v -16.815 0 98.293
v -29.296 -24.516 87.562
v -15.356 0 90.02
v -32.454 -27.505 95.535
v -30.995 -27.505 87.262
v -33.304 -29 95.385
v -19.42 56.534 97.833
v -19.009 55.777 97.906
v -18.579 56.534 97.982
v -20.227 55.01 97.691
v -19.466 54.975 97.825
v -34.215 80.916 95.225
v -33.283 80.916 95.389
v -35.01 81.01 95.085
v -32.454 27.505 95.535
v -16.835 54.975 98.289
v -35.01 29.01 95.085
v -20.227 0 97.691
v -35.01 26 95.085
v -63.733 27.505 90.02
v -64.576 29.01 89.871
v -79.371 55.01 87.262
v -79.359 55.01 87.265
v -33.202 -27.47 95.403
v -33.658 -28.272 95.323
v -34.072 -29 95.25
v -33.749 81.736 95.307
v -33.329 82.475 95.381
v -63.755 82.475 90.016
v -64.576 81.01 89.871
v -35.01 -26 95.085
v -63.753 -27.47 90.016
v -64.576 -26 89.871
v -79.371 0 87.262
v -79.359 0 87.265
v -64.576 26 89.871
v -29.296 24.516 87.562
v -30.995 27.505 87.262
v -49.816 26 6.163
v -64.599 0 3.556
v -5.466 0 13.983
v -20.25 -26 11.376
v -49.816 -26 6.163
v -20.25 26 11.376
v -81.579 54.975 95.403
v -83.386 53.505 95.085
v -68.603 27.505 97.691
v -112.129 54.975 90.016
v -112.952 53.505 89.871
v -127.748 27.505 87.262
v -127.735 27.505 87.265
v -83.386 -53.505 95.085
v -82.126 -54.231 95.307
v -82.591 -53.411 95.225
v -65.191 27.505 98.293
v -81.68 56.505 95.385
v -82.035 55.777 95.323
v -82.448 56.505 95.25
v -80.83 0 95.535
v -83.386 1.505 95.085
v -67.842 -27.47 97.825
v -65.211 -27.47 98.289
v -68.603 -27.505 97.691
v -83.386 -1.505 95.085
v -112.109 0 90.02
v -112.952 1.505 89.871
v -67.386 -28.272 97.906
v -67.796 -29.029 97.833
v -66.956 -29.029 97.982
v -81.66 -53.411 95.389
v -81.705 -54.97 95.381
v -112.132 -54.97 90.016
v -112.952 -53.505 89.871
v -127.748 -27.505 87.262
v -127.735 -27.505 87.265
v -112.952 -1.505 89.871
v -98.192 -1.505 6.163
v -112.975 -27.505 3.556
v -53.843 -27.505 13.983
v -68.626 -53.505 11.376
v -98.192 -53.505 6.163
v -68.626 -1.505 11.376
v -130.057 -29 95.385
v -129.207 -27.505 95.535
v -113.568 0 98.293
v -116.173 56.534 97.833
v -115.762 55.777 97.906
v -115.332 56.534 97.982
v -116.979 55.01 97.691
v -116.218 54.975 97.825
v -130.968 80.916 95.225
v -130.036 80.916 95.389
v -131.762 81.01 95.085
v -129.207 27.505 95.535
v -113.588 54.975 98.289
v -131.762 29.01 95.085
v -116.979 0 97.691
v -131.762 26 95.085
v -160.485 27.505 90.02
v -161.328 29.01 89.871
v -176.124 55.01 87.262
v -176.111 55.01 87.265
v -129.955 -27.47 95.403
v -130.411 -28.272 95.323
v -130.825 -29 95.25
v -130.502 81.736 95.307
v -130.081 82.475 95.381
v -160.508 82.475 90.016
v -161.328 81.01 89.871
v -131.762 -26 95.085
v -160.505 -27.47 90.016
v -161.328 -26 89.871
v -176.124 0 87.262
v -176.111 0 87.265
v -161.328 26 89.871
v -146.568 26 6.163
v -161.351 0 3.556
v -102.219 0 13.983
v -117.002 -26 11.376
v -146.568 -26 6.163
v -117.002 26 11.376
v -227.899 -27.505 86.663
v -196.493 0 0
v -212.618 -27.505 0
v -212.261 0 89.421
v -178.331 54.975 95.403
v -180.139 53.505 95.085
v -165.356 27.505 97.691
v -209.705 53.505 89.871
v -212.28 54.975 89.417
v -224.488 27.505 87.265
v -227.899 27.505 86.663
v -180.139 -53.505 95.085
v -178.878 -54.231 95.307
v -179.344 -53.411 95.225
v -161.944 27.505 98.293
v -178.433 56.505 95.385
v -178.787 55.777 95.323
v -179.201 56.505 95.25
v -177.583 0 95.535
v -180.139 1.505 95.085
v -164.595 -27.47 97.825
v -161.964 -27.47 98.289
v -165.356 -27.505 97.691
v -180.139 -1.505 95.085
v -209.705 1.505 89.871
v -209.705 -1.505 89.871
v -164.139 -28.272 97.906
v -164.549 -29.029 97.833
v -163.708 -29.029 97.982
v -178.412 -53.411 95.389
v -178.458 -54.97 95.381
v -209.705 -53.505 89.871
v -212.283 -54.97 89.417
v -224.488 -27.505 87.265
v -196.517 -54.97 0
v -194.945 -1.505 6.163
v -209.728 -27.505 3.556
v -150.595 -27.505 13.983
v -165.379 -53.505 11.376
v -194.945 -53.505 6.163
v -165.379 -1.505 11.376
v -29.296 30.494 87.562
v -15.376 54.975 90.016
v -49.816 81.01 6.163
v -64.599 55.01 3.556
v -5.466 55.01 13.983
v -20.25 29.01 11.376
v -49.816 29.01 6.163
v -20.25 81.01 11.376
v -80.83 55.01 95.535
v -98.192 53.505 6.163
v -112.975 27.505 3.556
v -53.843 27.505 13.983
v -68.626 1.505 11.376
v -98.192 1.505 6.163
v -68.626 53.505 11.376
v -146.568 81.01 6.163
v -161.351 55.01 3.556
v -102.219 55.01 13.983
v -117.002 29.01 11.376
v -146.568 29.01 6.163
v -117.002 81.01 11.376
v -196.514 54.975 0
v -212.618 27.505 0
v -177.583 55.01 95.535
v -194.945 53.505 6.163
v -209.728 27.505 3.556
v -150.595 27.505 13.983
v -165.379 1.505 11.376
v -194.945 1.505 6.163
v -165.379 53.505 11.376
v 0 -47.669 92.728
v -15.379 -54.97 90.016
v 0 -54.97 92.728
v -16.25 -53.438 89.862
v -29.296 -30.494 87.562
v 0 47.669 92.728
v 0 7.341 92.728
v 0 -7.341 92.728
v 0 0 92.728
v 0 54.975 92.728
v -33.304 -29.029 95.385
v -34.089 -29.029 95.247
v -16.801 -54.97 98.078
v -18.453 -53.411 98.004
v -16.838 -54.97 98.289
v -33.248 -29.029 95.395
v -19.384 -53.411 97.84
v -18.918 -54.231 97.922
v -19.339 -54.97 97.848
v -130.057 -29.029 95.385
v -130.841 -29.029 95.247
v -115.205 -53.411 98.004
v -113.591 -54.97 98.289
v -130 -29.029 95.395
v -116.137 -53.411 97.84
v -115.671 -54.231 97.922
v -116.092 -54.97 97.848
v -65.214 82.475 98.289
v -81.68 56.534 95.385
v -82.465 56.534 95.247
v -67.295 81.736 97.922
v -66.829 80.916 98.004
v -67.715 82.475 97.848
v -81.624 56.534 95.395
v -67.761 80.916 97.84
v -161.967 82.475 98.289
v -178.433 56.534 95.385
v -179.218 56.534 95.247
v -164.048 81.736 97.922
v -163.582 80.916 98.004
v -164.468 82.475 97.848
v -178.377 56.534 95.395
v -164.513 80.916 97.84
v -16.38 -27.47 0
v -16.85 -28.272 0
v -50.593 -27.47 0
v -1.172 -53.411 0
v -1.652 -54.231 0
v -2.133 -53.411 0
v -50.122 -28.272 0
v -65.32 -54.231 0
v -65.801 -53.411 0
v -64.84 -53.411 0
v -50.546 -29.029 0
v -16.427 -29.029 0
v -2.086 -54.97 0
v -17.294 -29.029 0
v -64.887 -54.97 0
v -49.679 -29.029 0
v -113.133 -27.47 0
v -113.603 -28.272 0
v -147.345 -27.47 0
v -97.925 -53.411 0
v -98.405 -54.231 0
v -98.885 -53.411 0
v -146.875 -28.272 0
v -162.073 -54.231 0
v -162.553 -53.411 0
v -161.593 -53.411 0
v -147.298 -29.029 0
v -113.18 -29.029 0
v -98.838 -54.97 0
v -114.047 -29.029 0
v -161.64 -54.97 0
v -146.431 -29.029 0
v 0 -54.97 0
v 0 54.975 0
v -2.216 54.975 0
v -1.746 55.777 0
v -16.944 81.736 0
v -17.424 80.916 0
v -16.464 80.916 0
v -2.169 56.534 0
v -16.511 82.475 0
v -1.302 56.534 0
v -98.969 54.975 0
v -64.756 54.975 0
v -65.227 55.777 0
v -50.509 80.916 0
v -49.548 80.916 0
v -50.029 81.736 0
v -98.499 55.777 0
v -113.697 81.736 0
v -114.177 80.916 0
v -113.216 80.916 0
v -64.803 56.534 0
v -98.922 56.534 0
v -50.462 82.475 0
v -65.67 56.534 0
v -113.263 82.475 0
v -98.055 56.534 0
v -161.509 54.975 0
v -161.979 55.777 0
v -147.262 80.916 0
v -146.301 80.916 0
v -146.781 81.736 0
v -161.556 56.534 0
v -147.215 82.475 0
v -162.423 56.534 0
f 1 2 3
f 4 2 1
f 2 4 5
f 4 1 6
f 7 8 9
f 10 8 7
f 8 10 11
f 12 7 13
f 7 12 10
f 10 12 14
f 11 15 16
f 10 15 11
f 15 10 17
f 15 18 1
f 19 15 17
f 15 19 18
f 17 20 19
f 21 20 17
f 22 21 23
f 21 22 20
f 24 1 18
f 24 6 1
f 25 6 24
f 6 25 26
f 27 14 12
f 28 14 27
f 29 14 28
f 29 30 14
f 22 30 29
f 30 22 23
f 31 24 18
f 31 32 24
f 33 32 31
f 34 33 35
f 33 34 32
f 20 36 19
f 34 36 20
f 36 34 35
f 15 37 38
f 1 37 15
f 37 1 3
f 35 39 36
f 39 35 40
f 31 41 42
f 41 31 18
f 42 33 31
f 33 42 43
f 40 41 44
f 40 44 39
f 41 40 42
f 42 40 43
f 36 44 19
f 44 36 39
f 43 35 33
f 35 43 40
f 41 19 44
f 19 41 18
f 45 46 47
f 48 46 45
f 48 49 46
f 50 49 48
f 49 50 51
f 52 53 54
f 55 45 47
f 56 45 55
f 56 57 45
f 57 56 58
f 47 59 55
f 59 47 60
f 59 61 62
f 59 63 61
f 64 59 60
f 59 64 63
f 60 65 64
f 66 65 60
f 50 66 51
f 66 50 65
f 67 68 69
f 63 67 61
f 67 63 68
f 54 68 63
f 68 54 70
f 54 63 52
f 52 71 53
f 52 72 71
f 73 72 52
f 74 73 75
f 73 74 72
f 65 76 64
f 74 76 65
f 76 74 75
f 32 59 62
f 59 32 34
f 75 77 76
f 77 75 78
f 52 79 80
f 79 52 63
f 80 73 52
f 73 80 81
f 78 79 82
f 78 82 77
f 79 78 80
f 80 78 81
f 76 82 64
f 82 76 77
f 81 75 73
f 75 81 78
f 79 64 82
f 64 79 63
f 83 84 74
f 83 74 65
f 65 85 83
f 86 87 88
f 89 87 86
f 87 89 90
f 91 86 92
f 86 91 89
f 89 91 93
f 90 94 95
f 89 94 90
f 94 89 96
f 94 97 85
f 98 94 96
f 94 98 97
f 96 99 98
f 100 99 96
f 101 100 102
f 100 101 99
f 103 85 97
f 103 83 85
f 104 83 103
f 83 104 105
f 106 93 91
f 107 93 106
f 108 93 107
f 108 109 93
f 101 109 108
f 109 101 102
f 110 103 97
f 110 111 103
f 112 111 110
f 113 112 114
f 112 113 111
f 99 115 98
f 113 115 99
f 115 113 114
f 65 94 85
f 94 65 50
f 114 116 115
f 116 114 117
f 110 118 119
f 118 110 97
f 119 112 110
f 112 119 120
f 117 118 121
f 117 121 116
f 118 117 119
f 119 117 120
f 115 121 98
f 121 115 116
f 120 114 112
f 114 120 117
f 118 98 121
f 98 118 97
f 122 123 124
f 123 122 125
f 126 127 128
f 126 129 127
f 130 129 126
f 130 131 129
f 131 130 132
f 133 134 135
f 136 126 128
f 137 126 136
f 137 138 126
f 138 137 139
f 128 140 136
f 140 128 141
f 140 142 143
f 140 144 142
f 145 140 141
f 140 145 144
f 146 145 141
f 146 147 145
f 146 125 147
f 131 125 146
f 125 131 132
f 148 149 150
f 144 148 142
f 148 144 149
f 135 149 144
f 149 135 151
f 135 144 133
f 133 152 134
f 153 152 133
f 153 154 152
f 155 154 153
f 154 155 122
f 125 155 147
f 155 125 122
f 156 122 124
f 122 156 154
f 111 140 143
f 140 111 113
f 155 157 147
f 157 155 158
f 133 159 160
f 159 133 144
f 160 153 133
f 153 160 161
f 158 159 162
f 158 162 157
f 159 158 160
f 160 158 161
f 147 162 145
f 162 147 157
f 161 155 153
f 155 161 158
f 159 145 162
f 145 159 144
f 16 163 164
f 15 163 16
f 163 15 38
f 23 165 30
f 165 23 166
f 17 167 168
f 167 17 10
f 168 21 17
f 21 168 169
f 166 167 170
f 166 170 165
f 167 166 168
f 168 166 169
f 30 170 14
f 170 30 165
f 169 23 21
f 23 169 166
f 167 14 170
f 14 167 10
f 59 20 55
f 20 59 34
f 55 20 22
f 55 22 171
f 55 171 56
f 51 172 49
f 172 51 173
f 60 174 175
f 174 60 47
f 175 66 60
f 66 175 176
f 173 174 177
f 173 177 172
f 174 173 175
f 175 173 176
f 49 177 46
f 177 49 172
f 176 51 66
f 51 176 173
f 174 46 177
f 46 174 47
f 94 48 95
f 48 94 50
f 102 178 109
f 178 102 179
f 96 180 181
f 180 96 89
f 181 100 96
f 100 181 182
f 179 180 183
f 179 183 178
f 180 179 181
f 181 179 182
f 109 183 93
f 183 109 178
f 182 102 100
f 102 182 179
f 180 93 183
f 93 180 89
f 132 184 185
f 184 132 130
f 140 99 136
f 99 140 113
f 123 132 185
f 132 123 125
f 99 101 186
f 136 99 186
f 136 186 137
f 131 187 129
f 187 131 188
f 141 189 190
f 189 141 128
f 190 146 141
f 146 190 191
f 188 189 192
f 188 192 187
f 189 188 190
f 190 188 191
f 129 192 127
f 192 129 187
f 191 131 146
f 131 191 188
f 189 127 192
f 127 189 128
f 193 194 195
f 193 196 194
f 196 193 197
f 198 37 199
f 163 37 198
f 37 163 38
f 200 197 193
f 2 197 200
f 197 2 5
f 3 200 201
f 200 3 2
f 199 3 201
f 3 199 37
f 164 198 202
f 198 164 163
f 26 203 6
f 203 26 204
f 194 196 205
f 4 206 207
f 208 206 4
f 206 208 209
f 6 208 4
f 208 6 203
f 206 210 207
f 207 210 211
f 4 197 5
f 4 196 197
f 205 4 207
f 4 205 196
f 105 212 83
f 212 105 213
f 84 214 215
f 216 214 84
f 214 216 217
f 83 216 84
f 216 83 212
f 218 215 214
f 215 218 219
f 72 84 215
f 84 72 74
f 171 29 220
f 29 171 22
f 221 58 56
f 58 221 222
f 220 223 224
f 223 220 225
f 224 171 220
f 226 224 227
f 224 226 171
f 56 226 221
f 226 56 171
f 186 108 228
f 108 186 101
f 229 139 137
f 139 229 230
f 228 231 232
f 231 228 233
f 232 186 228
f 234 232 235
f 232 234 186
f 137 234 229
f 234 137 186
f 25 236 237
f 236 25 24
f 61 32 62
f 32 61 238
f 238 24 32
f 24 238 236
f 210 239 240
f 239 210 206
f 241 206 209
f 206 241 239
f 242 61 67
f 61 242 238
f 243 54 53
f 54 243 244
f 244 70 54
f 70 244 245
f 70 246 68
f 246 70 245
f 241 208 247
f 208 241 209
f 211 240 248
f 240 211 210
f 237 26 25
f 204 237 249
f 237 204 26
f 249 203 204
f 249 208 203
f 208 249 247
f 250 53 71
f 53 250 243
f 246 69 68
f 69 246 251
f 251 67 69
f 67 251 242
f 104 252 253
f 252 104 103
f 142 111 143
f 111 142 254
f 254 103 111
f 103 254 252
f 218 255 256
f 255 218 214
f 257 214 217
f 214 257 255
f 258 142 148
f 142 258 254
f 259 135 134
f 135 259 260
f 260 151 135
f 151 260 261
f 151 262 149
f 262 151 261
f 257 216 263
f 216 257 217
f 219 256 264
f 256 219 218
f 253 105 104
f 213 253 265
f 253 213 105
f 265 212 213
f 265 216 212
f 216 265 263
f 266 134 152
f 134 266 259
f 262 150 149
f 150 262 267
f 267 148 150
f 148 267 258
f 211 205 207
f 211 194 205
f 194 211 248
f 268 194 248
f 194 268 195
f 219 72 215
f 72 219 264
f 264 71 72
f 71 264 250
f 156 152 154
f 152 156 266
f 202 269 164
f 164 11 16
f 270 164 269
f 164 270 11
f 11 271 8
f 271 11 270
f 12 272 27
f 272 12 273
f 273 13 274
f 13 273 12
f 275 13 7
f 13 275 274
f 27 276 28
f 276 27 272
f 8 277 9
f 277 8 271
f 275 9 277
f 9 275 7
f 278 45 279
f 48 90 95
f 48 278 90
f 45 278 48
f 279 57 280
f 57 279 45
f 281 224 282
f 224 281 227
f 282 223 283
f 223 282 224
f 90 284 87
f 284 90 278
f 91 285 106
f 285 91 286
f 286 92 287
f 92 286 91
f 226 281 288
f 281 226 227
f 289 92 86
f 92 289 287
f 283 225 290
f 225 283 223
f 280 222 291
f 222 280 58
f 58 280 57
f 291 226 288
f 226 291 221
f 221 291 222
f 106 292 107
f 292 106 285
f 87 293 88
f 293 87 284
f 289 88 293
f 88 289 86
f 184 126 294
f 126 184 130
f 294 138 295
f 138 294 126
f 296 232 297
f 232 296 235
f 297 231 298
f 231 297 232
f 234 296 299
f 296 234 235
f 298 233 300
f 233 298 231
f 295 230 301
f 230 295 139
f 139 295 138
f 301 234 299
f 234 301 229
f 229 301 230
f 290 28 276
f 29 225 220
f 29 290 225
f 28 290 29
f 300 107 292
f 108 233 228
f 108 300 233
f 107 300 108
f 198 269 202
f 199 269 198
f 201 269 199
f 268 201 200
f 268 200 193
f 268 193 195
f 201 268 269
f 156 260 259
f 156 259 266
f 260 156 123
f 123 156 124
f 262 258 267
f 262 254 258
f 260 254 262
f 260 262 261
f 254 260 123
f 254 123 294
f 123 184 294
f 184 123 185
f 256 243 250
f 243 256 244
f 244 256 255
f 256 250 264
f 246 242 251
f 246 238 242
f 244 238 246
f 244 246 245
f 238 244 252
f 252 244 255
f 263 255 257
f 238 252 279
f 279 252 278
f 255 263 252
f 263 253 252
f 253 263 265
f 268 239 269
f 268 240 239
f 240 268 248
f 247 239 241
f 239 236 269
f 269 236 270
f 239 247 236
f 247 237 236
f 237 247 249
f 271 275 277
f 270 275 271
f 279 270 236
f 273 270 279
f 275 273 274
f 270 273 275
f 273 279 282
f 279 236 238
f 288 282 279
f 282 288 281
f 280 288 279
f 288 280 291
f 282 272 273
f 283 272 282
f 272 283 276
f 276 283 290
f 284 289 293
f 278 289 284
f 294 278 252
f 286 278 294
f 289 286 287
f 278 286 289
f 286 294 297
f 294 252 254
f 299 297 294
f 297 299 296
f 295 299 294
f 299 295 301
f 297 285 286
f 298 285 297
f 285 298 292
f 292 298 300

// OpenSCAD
// =================================================================
// A modular hexagonal rack, good for storing cylinders such as
// spice jars!
// =================================================================
// Copyright Jody Sankey 2019.
//
// This work is licensed under the Creative Commons Attribution 4.0
// International License. To view a copy of this license, visit 
// http://creativecommons.org/licenses/by/4.0/ or send a letter to
// Creative Commons, PO Box 1866, Mountain View, CA 94042, USA.
// =================================================================


// CONTROL VARIABLES
// =================

// Width across flats of each hole.
hole_af = 52;
// Maximum depth of each hole.
max_depth = 85;
// The angle of each hole away from horizontal
angle = 10;
// Thickness of the wall between holes.
wall = 3;
// Length of each side on interlocking tabs as a fraction of wall thickness.
tab_fraction = 0.3;
// Gap between large mating faces at the interlocking tabs.
tab_margin = 0.08;
// Small offset to ensure differences are resolved correctly.
nudge = 0.01;

// Use the "output" section at the bottom of the file to control the
// number of rows and columns, and which sides have interlocking tabs.





// CALCULATED VARIABLES
// ====================

// Width across corners of each hole.
hole_ac = hole_af/sin(60);
// Width across flats of the block each hole is cut from.
block_af = hole_af + 2*wall;
// Width across corners of the block each hole is cut from.
block_ac = block_af/sin(60);

// Spacing between horizontal centers
horizontal_spacing = hole_af+wall+nudge;
// Spacing between vertical centers
not_yet_projected_spacing = ((hole_af+wall)/sin(60) * 3/4) + nudge;
vertical_spacing = not_yet_projected_spacing /cos(angle);



// HELPER MODULES
// ==============

// Returns a hexagonal prism with a centreline on y/z and a body increasing in x
module hex_prism(length, width_af) {
  rotate([0,90,0])
    linear_extrude(height=length)
    circle(r=(width_af/2/sin(60)), $fn=6);
}

// Returns a locking tab with the key face on x/z, centered on z.
//   length(float) - Length of the part in z.
//   side (float) - Length of each triangle side. 
//   y_positive (boolean) - If true, the body of the triangle is on the +y side. 
module tri_prism(length, side, y_positive) {
  translate([0, y_positive ? tan(30)*side/2 : -tan(30)*side/2])
  rotate([0,90,0])
    rotate([0, 0, y_positive ? -30 : 30])
    linear_extrude(height=length)
    circle(r=side/2/cos(30), $fn=2);
}

// Returns a locking tab with the key face on x/z, centered on z.
module trapezoid(length, side) {
  rotate([0,90,0])
    linear_extrude(height=length)
     polygon(points=[[side/2+wall*tan(30),0],
                     [side/2+wall/2*tan(30), wall/2],  
                     [-side/2-wall/2*tan(30), wall/2],  
                     [-side/2-wall*tan(30), 0]]);  
}

// Pivots child(0) around y by the specified angle, centered at height z.
module rotate_with_offset(angle, z_position) {
  translate([0,0,z_position/cos(angle)])
  rotate([0,-angle,0])
  translate([0,0,-z_position])
  children([0]);
}

// Removes any part of child(0) that is past the y-z plane.
module remove_negative_x(max_dimension) {
  difference() {
    children([0]);
    translate([-max_dimension/2, 0, 0])
      cube(size=max_dimension, center=true);
  }
}

// Removes any part of child(0) that is past the y-z plane.
module remove_negative_z(max_dimension) {
  difference() {
    children([0]);
    translate([0,0, -max_dimension/2])
      cube(size=max_dimension, center=true);
  }
}


// BLOCK CONSTRUCTION
// ==================

// Returns a single cell, centered on y=0,z=0
//   hole (boolean) - If true, remove the interior of the cell.
module cell(hole) {
  rotate_with_offset(angle, block_ac/2) {
    difference() {
      translate([-block_ac,0,0])
      hex_prism(length=max_depth+wall+block_ac,width_af=block_af);
      if(hole == true) {
        translate([wall,0,0])
        hex_prism(length=max_depth+wall+block_ac,width_af=hole_af);
      }
    }
  }
}

// Returns a modified cell that can be subtracted from the spaces
// adjacent to the cells on the edge of block to form an interlocking
// edge, centered on y=0,z=0.
module edge_cutter() {
  raw_length = max_depth+2*block_ac;
  // Note we add half the desired margin to the hex prism, the other half will
  // be removed by the edge cutter on the mating face.
  cutter_af = block_af-wall+tab_margin;
  cutter_ac = cutter_af/sin(60);
  cutter_side = cutter_ac/2;
  tab_side = wall*tab_fraction;
  overcut_tab_side = tab_side + tab_margin*tan(30);
  undercut_tab_side = tab_side - tab_margin*tan(30);
  triangle_side = wall;
  
  // Generates a larger triangular prism suitable for adding to the cutter to
  // cut a groove in the part. The triangle is pointing right iff
  // point_right==true, with the opposite key face aligned on y=0. If z_positive
  // is true, the top corner is at z=overcut_tab_side, else the bottom corner is at
  // z=-overcut_tab_side.
  module groove(point_right, z_positive) {
    side = overcut_tab_side;
    translate([0,0,(z_positive ? 1 : -1)*(side/2-nudge)])
      tri_prism(length=raw_length, side=side+2*nudge, y_positive=point_right);    
  }
  
  // Generates a smaller triangular prism suitable for subtracting from the cutter
  // to cut a tooth in the part. The triangle is pointing right iff
  // point_right==true, with the opposite key face aligned on y=0. If z_positive
  // is true, the top corner is at z=z_distance, else the bottom corner is at
  // z=-overcut_tab_side.
  module tooth(point_right, z_positive) {
    side = undercut_tab_side;
    translate([-nudge,0,(z_positive ? 1 : -1)*(side/2-nudge)])
      tri_prism(length=raw_length+2*nudge, side=side+2*nudge, y_positive=point_right);    
  }

  // Translates the child elements along a diagonal face of the hex prism.
  // z_positive and y_positive specify the face, y_distance the distance
  // from the centerline.
  module translate_along_face(y_positive, z_positive, y_distance) {
    translate([
       0,
       (y_positive ? 1 : -1)*y_distance,
       (z_positive ? 1 : -1)*(cutter_ac/2-y_distance*tan(30))])
      children();
  }

  rotate_with_offset(angle, block_ac/2) {
    translate([-block_ac+nudge,0,0])
    difference() {
      union() {
        hex_prism(length=raw_length,width_af=cutter_af);
        for (z_positive=[false,true], y_positive=[false,true]) {
          // Add cutting material to form outboard grooves.
          translate_along_face(y_positive, z_positive, cutter_af/2)
            groove(point_right=!y_positive, z_positive=z_positive);
          // Add cutting material to form inboard grooves.
          translate_along_face(y_positive, z_positive, tab_margin/2+tab_side*2*sin(60))
            groove(point_right=!y_positive, z_positive=z_positive);
        }
      }
      for (z_positive=[false,true], y_positive=[false,true]) {
        // Remove cutting material to form inboard teeth.
        translate_along_face(y_positive, z_positive, tab_margin/2)
          tooth(point_right=y_positive, z_positive=!z_positive);
        // Remove cutting material to form outboard teeth.
        translate_along_face(y_positive, z_positive, cutter_af/2-2*tab_side*sin(60))
          tooth(point_right=y_positive, z_positive=!z_positive);

      }          
    }
  }
}

// Returns the matrix of all cells.
module block(rows, columns, left_tabs, right_tabs) {
  rotate([0,-90,0])
  remove_negative_x(max_dimension=2*(columns+rows)*horizontal_spacing) {
    remove_negative_z(max_dimension=2*columns*(max_depth*horizontal_spacing)) {
      difference() {
        union() {
          // Matrix of the full cells plus partials.
          for (c=[0:columns-1]) {
            // A bottom row of spacers, most of which will be sliced off.
            translate([0,(c-0.5)*horizontal_spacing,block_ac/2-vertical_spacing])
              cell(hole=false);      
            // The normal matrix.
            for (r=[0:rows-1]) {
              translate([0,(c-(r%2)/2)*horizontal_spacing,r*vertical_spacing+block_ac/2])
                cell(hole=true);
            }
          }
          // Additional cells to the sides with tabs to create mating diagonal walls.
          if (left_tabs) {
            for (r=[0:2:rows-1]) {
              translate([0,-horizontal_spacing,r*vertical_spacing+block_ac/2])
                cell(hole=false);
            }
          }
          if (right_tabs) {
            for (r=[-1:2:rows-1]) {
              translate([0,(2*columns-1)/2*horizontal_spacing,r*vertical_spacing+block_ac/2])
                cell(hole=false);
            }
          }
        }
        // Add the interlocking pattern on each side if requested.
        if (left_tabs) {
          for (r=[0:2:rows-1]) {
            // Cut from all the right-offset rows.
            translate([0,-horizontal_spacing,r*vertical_spacing+block_ac/2])
              edge_cutter();
          }
          if (rows%2 == 1) {
            // Remove the weak strip this would leave on the top row.
            translate([0,-horizontal_spacing,(rows-1)*vertical_spacing+block_ac/2+wall])
              edge_cutter();
          }
          // Remove all material beyond the wall centerline on the left-most rows.
          translate([-nudge,-(2*horizontal_spacing-tab_margin/2),-nudge])
            cube([2*max_depth, horizontal_spacing, rows*horizontal_spacing]);
        }
        if (right_tabs) {
          for (r=[-1:2:rows-1]) {
            // Cut from all the left-offset rows.
            translate([0,(2*columns-1)*horizontal_spacing/2,r*vertical_spacing+block_ac/2])
              edge_cutter();
          }
          if (rows%2 == 0) {
            // Remove the weak strip this would leave on the top row.
            translate([0,(2*columns-1)*horizontal_spacing/2,(rows-1)*vertical_spacing+block_ac/2+wall])
              edge_cutter();
          }
          // Remove all material beyond the wall centerline on the left-most rows.
          translate([-nudge,(0.5+columns-1)*horizontal_spacing-tab_margin/2,-nudge])
            cube([2*max_depth, horizontal_spacing, rows*horizontal_spacing]);
        }
      }
    }
  }
}



// FINAL OUTPUT
// ============

// Comment or uncomment the examples below, or create new ones.


// The next three lines are left, middle, and right segments that interlock.
// 4 rows / 3 columns is the max size for a Prusa mk3 printer.
// -------------------------------------------------------------------------

//block(rows=4, columns=3, left_tabs=false, right_tabs=true);
block(rows=4, columns=2, left_tabs=true, right_tabs=true);
//block(rows=4, columns=3, left_tabs=true, right_tabs=false);


// The next line is a standalone 3x4 block that doesn't interlock.
// 4 rows / 3 columns is the max size for a Prusa mk3 printer.
// -------------------------------------------------------------------------

//block(rows=4, columns=3, left_tabs=false, right_tabs=false);
